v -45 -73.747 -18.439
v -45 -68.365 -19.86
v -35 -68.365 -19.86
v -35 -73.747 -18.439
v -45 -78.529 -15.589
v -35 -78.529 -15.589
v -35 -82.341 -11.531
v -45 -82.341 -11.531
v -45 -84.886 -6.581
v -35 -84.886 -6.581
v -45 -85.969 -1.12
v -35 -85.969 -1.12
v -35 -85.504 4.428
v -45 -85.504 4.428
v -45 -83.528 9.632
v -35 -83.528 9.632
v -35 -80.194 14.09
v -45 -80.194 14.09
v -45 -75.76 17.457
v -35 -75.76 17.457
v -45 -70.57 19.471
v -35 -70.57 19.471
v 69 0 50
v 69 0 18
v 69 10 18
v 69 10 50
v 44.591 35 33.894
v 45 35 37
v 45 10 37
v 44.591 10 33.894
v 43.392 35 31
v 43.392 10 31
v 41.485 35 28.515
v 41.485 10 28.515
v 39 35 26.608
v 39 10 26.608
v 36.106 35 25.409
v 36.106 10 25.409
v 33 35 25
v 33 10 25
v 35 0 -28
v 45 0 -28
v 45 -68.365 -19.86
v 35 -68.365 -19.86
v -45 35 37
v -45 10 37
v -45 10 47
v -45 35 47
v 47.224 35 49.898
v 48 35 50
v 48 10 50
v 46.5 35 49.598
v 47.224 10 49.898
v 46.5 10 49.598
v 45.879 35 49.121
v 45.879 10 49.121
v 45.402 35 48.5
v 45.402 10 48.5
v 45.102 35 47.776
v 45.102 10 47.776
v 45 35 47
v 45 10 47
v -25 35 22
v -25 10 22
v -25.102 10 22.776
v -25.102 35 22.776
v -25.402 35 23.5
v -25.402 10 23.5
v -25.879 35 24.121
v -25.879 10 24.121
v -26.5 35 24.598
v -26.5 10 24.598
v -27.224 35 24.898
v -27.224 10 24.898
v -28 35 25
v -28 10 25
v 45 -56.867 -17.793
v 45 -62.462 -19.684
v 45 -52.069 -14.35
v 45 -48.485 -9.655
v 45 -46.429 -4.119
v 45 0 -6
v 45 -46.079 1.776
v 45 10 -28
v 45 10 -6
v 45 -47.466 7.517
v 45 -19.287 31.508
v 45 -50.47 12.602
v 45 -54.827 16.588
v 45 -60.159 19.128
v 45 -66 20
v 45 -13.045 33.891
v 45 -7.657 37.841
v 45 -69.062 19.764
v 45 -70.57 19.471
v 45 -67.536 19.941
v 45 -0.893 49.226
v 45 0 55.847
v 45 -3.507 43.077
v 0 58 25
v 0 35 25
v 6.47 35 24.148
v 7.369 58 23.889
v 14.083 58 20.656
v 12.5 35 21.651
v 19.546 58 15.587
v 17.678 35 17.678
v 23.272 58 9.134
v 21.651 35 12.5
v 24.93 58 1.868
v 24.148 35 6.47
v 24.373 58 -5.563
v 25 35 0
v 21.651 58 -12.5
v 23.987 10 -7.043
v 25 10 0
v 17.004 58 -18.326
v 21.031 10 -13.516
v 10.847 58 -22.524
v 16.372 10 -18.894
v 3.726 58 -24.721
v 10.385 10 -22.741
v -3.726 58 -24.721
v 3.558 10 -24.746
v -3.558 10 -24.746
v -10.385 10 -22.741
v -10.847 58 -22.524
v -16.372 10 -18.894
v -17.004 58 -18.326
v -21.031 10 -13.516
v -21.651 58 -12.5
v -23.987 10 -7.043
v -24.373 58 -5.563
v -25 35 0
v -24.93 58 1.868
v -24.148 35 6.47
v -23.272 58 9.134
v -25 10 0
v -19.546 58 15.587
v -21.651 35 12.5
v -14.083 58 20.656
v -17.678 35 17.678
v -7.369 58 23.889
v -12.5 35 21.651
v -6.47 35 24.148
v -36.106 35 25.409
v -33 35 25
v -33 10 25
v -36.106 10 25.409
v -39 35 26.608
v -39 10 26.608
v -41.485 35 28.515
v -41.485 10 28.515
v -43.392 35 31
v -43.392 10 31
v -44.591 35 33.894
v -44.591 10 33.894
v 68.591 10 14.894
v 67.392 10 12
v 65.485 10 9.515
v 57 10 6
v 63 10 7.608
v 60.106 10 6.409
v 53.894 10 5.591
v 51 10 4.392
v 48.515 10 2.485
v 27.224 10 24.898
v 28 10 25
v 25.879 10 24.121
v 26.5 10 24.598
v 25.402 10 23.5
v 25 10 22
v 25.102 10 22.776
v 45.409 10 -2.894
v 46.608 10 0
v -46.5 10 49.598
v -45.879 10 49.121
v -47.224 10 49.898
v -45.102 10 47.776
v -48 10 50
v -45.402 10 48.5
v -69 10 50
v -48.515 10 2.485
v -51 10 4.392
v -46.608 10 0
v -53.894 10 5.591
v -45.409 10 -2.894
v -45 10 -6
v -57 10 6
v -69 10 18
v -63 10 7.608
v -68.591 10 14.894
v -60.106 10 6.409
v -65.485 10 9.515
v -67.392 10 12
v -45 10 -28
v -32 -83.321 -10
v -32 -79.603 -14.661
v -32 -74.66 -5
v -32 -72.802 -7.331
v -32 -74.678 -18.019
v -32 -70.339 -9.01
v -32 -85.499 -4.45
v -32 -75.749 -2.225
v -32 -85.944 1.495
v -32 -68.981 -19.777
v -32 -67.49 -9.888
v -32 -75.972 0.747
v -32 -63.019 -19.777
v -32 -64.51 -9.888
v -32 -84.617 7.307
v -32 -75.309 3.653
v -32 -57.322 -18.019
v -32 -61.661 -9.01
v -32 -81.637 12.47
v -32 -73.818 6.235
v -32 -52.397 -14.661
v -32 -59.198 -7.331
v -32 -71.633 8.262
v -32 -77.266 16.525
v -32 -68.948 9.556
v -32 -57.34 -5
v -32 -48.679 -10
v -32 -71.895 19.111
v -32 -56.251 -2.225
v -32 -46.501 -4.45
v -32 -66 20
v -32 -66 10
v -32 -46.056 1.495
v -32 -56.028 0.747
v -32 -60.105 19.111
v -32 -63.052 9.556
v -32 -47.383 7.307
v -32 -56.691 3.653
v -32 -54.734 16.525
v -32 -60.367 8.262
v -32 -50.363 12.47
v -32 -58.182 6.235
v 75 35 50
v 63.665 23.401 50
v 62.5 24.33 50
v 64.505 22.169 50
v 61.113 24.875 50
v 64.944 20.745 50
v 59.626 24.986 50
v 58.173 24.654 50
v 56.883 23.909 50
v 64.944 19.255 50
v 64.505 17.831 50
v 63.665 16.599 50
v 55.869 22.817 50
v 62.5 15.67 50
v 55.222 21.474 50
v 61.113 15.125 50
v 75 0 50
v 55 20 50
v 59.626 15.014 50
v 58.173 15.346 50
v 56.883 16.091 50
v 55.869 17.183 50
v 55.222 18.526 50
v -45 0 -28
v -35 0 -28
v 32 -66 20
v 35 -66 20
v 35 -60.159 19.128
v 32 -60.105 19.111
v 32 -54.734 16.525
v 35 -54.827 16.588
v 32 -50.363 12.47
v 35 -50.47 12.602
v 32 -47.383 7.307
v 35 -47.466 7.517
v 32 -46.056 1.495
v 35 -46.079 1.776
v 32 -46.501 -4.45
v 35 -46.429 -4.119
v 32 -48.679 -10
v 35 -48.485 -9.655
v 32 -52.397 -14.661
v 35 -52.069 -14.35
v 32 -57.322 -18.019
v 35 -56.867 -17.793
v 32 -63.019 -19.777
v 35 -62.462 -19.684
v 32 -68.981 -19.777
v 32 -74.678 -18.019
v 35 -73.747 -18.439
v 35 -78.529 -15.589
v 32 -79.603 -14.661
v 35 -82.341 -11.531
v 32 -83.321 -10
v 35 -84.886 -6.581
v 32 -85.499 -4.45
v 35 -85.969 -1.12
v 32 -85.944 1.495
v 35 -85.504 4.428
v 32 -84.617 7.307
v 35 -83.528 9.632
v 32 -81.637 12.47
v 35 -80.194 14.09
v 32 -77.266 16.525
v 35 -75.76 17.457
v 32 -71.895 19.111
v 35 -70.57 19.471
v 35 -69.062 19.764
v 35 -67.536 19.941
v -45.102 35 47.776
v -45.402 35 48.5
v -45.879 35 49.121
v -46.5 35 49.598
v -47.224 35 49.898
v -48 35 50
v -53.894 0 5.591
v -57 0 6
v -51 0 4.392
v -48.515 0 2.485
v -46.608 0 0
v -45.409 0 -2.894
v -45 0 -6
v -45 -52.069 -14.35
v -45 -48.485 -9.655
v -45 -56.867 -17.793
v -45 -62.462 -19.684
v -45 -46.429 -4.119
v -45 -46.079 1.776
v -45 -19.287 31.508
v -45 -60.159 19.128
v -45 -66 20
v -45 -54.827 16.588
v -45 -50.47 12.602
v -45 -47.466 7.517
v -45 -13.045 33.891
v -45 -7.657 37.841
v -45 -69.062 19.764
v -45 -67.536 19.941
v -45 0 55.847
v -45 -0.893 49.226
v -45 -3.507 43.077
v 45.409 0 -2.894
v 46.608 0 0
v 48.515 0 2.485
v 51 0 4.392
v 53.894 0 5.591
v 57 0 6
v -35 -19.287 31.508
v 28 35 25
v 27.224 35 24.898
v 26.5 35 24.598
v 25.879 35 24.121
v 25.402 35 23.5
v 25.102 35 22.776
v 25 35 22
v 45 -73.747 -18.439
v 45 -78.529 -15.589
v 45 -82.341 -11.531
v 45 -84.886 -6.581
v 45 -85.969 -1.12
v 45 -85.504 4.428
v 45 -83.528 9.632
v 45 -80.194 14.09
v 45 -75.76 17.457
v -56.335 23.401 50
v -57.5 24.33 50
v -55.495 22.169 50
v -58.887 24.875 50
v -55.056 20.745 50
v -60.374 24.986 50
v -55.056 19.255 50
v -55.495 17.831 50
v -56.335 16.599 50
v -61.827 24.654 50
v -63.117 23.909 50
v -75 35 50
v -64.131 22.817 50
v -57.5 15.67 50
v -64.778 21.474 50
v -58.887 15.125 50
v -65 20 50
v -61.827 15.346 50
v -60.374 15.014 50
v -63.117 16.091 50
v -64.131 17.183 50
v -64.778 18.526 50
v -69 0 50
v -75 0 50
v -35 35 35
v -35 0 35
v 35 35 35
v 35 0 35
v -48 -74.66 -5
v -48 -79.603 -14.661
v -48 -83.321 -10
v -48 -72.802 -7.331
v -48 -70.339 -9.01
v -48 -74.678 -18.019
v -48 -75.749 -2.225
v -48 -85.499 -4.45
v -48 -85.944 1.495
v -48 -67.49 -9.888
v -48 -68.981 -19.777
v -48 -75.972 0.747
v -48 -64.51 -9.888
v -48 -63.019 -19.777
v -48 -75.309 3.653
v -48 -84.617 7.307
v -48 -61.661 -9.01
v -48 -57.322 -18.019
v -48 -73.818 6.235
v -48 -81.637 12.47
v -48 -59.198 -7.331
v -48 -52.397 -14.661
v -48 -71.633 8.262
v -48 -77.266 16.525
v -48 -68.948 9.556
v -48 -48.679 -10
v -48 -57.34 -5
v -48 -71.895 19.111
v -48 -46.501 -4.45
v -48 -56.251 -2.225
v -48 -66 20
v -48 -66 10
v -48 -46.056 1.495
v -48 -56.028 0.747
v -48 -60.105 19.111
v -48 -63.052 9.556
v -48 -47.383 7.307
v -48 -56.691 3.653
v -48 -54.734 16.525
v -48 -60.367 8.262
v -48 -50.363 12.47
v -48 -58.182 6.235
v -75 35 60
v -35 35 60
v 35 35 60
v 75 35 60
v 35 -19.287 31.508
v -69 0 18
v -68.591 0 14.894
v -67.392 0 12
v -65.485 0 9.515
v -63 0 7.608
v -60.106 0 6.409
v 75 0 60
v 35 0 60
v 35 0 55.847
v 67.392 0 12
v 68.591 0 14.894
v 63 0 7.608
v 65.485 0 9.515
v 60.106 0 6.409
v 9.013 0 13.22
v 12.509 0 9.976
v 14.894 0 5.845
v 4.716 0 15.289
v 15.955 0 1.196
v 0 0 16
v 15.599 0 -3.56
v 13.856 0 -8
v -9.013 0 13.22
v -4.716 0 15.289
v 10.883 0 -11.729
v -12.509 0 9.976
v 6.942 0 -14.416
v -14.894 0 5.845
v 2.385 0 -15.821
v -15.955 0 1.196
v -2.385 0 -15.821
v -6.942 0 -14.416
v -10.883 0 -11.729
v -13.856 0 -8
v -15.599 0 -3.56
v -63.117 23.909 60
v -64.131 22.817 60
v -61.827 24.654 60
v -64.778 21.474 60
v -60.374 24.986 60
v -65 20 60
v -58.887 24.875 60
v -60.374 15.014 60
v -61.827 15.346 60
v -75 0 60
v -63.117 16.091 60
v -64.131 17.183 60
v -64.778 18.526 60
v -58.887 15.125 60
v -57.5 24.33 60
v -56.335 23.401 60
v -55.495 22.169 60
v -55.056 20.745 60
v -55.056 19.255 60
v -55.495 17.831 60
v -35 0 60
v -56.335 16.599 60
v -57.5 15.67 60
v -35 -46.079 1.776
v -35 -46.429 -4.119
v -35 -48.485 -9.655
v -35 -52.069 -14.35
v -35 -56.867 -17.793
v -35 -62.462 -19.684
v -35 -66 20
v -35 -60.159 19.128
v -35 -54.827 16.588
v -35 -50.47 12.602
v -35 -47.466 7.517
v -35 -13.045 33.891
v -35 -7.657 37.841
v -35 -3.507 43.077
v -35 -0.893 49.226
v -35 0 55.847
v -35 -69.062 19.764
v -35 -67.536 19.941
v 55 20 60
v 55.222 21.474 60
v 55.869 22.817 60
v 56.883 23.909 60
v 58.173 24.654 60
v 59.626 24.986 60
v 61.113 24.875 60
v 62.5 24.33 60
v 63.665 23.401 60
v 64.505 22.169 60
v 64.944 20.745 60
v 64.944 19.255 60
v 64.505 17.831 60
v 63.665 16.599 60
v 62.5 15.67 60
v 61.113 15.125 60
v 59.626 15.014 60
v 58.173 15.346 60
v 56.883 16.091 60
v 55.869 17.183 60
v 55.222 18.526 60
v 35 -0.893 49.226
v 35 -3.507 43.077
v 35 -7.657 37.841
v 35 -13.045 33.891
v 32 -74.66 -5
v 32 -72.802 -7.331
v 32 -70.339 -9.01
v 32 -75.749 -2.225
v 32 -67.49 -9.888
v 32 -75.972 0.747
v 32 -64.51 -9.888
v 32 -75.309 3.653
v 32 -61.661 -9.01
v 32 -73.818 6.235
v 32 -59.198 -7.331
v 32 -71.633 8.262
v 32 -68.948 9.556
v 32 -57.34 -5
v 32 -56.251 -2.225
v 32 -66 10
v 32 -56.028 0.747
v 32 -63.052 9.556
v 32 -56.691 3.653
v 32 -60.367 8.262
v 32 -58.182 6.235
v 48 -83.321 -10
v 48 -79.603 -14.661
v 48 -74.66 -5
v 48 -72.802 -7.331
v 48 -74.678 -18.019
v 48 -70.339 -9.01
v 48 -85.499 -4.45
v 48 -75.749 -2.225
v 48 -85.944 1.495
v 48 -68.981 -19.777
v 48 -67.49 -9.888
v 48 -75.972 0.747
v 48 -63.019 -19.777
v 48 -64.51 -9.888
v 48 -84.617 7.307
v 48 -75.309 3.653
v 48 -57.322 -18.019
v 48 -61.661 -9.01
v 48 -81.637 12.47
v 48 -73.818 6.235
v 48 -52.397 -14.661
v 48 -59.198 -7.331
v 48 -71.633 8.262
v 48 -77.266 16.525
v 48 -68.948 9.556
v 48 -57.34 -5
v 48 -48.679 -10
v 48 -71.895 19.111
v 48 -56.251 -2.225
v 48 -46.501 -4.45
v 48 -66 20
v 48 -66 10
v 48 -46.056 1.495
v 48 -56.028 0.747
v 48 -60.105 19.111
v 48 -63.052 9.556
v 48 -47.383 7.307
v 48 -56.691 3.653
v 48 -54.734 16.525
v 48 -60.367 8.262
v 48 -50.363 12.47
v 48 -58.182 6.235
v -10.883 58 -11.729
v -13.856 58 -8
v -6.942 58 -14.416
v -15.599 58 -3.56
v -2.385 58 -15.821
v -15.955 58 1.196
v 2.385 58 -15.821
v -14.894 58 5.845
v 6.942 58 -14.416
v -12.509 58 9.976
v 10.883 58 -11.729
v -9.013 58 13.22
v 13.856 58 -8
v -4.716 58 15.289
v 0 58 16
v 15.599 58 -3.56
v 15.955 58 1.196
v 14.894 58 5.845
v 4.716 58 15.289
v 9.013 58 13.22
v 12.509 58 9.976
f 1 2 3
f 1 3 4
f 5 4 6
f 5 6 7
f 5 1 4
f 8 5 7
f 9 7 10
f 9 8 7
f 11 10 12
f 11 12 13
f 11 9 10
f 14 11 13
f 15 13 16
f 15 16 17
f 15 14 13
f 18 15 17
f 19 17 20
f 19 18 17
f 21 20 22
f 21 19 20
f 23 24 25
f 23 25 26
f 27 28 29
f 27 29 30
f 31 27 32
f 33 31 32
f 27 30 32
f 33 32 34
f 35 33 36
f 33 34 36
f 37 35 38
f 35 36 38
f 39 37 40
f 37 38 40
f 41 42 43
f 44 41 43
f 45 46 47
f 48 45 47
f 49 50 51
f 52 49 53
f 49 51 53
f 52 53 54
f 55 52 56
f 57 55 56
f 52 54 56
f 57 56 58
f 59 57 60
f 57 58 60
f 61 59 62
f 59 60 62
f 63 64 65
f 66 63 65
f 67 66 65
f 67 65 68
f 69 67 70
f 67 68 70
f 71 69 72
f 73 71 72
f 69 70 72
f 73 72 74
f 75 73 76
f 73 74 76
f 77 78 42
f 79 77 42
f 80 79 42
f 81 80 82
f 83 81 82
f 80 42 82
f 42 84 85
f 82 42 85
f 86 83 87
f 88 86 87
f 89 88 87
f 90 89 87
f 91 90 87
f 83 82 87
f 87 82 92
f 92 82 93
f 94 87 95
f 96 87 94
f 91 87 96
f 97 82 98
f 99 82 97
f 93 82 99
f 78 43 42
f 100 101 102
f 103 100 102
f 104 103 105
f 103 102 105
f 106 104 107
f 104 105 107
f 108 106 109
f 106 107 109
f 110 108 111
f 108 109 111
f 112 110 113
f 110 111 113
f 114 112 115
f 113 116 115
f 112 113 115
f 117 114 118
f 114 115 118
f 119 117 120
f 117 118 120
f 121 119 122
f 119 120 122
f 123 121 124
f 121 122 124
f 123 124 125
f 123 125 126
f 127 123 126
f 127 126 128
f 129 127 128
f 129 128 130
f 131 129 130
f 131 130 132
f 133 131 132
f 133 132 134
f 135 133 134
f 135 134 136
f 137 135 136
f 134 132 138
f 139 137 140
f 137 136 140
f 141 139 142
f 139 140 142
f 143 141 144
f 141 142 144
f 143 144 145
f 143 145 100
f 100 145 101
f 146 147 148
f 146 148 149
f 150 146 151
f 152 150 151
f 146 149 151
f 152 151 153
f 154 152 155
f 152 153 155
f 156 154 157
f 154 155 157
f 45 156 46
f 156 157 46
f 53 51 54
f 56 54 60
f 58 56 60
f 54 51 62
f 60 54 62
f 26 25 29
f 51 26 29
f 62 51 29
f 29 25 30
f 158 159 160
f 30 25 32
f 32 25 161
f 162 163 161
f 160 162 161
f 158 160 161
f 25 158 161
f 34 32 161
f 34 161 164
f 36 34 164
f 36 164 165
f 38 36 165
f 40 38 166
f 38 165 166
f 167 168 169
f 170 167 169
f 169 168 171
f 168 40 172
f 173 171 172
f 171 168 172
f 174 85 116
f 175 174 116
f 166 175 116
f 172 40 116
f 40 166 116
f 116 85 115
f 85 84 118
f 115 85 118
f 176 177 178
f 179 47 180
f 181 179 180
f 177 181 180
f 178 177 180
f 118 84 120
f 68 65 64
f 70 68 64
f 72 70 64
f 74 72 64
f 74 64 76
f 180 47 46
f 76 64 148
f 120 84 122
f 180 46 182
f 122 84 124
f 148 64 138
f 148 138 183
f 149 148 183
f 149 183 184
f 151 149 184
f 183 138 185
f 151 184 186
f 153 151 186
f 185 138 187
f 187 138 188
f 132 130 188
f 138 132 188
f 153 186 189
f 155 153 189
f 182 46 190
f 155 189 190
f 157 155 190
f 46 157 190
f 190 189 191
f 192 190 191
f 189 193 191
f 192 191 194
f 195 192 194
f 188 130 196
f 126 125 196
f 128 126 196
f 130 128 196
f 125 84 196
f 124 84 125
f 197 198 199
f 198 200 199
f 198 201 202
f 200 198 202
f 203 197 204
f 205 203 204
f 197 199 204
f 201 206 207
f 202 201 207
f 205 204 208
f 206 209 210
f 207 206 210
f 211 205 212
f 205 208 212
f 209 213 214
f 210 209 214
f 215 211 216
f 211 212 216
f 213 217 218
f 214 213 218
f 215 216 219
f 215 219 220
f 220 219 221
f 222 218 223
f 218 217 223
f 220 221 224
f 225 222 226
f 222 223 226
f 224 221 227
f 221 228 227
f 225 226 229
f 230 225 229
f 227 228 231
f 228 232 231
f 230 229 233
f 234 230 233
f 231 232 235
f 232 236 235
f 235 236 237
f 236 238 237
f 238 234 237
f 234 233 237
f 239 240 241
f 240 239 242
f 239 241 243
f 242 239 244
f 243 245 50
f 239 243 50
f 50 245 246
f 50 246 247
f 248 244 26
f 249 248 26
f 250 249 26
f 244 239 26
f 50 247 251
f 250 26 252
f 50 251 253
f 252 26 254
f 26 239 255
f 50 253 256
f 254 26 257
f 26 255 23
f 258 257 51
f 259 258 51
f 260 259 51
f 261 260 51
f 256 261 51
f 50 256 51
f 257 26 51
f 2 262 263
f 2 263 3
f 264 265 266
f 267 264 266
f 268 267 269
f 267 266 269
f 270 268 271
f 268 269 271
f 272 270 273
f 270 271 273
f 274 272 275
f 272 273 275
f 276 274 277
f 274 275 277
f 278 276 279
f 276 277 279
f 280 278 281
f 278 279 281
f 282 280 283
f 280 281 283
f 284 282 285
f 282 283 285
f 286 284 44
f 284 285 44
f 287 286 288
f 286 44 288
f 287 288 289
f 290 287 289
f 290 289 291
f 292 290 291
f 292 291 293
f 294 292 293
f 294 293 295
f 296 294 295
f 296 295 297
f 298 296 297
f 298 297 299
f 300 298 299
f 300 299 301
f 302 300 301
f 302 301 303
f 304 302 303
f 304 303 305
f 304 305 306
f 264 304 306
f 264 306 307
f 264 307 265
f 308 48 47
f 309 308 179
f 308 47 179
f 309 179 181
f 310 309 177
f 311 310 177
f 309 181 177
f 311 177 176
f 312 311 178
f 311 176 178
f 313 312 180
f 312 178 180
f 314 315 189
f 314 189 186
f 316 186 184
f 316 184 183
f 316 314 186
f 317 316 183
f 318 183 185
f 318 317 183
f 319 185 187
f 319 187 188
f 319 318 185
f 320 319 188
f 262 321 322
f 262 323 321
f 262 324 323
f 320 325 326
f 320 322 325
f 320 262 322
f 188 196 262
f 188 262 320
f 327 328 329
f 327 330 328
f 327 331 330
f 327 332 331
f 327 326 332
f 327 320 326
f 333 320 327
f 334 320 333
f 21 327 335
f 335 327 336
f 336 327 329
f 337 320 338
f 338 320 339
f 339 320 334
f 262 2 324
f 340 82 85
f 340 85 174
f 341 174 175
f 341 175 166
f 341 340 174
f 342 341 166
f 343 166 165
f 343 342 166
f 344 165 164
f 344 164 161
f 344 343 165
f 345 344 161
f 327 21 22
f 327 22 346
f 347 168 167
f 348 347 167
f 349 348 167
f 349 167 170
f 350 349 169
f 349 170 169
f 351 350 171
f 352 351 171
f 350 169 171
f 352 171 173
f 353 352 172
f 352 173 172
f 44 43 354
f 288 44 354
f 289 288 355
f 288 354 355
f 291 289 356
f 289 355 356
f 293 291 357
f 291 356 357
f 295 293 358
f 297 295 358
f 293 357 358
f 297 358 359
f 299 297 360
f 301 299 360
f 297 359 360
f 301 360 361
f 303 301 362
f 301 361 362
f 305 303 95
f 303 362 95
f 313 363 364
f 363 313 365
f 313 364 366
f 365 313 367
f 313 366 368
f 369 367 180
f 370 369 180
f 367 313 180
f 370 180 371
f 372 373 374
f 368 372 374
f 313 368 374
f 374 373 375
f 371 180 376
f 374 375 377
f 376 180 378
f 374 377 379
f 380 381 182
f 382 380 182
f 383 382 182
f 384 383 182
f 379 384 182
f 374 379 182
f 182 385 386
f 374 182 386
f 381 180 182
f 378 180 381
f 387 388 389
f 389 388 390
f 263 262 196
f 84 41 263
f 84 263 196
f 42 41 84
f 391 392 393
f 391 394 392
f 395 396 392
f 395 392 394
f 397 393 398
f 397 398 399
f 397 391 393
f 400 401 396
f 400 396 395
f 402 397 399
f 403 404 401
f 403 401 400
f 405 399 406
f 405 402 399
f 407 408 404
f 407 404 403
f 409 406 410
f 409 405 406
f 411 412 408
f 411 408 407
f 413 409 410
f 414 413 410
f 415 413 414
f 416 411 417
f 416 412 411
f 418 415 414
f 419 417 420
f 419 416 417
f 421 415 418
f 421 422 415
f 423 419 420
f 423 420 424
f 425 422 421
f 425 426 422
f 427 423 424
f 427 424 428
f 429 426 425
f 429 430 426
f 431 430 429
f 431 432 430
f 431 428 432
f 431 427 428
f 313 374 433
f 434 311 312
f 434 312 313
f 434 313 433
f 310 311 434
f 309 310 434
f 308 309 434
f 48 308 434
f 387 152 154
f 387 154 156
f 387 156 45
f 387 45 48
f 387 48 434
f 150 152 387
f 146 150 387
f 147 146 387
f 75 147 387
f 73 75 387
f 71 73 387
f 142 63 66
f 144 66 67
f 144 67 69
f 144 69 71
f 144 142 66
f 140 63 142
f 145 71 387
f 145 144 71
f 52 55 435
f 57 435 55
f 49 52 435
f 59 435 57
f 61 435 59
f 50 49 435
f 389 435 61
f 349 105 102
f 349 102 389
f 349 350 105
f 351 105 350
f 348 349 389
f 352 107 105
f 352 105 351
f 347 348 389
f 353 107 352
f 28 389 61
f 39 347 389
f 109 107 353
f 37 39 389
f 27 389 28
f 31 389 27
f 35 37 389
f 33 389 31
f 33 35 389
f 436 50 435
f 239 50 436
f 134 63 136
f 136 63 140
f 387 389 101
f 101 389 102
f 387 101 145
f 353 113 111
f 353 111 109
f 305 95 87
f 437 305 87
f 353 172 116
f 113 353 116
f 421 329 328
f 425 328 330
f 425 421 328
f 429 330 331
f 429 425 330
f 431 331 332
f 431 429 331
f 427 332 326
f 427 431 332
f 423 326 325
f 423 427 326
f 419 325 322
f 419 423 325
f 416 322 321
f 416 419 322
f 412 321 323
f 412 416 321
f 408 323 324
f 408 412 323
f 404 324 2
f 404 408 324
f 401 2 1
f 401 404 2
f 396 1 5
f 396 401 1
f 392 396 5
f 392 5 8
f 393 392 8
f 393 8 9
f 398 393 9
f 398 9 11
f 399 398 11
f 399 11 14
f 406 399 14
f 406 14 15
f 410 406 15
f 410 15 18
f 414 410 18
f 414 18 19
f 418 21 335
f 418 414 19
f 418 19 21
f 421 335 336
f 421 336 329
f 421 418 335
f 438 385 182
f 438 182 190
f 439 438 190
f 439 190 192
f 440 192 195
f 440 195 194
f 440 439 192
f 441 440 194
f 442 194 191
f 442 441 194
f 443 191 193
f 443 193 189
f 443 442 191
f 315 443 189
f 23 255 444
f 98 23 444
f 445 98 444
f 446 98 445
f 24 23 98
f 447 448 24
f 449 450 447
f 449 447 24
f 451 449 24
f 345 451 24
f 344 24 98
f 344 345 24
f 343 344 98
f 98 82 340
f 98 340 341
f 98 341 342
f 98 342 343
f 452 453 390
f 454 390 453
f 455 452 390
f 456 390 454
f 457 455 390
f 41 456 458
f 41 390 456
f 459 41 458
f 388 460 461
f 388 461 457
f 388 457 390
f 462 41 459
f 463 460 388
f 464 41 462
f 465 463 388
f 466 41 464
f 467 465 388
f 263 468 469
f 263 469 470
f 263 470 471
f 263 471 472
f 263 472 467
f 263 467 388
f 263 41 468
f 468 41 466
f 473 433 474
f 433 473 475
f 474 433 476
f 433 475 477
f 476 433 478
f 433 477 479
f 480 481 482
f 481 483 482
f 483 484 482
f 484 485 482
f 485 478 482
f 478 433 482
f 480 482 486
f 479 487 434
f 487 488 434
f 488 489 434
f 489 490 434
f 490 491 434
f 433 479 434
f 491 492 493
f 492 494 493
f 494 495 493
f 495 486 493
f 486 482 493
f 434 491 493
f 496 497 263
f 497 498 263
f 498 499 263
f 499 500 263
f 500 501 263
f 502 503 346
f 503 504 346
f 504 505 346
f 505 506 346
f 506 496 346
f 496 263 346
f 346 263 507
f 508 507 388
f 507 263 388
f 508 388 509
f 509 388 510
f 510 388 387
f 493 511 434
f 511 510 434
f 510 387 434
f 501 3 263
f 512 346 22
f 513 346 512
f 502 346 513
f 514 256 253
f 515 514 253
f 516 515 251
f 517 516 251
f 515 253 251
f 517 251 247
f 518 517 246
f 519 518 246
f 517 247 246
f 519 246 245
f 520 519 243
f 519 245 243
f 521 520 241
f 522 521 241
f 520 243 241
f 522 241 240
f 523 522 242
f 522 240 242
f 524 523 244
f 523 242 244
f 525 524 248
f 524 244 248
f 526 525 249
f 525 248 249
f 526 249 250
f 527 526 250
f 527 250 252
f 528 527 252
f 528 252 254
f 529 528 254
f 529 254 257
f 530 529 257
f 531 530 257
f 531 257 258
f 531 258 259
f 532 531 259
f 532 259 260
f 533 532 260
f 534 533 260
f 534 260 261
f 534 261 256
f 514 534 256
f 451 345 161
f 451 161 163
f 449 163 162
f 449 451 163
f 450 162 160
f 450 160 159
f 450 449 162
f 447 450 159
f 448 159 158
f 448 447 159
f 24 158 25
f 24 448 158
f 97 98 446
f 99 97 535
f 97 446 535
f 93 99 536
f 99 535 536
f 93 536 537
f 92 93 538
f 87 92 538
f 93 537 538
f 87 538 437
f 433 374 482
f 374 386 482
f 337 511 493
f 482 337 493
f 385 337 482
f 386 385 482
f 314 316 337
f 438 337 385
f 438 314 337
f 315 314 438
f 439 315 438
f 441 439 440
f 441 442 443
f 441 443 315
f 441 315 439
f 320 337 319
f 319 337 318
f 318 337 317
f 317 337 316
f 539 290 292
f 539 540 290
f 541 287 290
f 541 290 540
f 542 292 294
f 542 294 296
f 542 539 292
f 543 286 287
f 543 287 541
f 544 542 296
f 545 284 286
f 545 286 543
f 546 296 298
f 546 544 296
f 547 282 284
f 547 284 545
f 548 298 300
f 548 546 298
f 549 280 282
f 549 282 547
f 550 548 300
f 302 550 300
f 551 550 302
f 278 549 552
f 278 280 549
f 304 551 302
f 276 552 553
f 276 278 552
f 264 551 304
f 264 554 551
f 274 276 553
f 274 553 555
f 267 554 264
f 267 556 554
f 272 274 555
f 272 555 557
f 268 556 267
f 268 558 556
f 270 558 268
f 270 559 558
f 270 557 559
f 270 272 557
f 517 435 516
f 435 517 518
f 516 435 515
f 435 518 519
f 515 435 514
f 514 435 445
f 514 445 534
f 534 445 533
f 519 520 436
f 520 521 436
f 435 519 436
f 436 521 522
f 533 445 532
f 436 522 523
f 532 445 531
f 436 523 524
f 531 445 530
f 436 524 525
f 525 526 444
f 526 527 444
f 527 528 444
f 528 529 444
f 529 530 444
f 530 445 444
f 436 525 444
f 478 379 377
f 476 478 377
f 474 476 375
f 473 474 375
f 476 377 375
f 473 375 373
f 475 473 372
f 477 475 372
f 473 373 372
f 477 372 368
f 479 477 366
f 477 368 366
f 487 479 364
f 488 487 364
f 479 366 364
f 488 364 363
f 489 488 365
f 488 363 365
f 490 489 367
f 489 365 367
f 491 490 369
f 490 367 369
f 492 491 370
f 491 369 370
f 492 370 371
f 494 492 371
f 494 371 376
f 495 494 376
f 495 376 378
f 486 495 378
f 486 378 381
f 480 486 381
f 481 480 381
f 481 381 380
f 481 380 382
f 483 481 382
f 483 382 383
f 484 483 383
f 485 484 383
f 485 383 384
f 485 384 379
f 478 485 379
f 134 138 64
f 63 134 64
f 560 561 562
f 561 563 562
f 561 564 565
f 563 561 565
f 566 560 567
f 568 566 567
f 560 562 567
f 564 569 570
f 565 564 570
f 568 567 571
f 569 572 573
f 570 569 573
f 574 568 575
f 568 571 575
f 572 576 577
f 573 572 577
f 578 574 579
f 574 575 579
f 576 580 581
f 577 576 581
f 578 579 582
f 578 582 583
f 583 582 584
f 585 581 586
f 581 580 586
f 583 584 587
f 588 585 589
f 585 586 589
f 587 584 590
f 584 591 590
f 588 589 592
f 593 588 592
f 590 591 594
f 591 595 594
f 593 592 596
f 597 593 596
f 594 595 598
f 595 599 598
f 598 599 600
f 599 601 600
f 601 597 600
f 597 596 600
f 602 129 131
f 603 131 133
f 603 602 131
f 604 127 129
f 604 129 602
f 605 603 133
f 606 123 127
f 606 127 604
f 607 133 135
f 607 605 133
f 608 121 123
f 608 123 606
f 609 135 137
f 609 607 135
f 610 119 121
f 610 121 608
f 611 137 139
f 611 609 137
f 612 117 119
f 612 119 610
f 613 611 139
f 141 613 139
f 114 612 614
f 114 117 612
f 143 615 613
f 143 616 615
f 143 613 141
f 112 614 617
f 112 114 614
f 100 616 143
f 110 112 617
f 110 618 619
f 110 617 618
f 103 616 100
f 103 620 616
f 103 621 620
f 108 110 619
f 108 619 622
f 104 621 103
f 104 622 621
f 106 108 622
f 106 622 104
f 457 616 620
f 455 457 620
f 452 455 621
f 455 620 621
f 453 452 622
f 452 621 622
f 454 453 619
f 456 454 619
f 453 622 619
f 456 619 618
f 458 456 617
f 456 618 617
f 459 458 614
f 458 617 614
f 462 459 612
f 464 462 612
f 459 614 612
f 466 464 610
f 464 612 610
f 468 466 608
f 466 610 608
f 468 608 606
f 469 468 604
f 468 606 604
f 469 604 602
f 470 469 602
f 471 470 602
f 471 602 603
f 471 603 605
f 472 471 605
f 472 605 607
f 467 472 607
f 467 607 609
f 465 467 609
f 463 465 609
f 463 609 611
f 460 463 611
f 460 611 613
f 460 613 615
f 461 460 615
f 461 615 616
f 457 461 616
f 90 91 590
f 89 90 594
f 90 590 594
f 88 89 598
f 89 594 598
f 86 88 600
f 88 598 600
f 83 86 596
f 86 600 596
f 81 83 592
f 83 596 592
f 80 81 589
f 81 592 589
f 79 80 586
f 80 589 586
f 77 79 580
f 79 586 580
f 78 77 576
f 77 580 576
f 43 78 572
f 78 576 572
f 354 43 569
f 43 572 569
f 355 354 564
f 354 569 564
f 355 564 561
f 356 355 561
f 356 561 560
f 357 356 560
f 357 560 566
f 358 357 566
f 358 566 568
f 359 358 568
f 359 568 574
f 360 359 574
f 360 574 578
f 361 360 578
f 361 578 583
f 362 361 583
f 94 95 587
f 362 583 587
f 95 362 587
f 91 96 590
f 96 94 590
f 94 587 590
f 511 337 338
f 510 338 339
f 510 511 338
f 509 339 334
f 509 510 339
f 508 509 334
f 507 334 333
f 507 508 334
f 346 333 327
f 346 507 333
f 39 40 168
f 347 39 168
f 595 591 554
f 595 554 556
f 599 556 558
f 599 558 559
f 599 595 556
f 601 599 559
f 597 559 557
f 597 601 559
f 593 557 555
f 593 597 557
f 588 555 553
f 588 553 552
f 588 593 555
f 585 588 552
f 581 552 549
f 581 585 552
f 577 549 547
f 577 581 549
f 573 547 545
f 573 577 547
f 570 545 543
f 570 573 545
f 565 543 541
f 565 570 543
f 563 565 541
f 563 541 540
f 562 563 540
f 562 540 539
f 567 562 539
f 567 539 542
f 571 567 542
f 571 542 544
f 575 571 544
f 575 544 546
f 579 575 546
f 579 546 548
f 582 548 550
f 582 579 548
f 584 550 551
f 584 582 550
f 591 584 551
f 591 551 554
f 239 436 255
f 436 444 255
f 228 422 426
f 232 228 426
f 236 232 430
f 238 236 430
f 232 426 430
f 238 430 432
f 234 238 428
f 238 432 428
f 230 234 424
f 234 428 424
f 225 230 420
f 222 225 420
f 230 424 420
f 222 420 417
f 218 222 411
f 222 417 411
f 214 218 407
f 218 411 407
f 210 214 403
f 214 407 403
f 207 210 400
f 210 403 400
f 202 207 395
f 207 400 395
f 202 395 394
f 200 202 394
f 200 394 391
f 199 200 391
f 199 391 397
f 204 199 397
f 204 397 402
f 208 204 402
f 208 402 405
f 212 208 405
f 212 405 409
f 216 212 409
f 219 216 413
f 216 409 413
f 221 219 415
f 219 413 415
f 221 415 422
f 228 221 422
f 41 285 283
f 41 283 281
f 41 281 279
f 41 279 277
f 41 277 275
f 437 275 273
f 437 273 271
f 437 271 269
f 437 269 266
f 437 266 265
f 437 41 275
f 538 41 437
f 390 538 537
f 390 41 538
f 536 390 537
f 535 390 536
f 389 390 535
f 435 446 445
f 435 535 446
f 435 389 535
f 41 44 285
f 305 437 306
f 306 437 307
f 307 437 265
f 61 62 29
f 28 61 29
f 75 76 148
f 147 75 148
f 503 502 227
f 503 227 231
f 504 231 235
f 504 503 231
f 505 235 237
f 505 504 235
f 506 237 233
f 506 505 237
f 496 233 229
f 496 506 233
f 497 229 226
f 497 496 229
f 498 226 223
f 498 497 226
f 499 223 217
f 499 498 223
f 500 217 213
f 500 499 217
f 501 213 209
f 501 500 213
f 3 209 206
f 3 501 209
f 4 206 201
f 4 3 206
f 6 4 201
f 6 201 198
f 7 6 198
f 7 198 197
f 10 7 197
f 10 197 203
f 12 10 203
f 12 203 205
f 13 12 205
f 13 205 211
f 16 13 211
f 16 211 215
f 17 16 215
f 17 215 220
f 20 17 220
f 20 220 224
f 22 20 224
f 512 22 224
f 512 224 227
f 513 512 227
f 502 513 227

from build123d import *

# Parameters (mm, degrees)
BOSS_EXTRUDE1_DEPTH  = 10
SKETCH2_R            = 25
BOSS_EXTRUDE2_DEPTH  = 48
SKETCH3_R            = 16
CUT_EXTRUDE1_DEPTH   = 59
BOSS_EXTRUDE3_DEPTH  = 25
BOSS_EXTRUDE5_DEPTH  = 10
SKETCH6_R            = 20
BOSS_EXTRUDE6_DEPTH  = 8
SKETCH7_R            = 10
CUT_EXTRUDE2_DEPTH   = 16
FILLET1_R            = 25
FILLET1_OF_MIRROR1_R = 25
CUT_EXTRUDE3_REACH   = 12
SKETCH8_R            = 5


with BuildPart() as part:
    # Sketch1 → Boss-Extrude1 (new body)
    with BuildSketch(Plane(origin=(0, 0, 0), x_dir=(1, 0, 0), z_dir=(0, 1, 0))):
        with BuildLine():
            Line((-45, 28), (45, 28))
            Line((45, 28), (45, 6))
            ThreePointArc((45, 6), (48.514718626, -2.485281374), (57, -6))
            ThreePointArc((57, -6), (65.485281374, -9.514718626), (69, -18))
            Line((69, -18), (69, -50))
            Line((69, -50), (75, -50))
            Line((75, -50), (75, -60))
            Line((75, -60), (35, -60))
            Line((35, -60), (35, -35))
            Line((35, -35), (-35, -35))
            Line((-35, -35), (-35, -60))
            Line((-35, -60), (-75, -60))
            Line((-75, -60), (-75, -50))
            Line((-75, -50), (-69, -50))
            Line((-69, -50), (-69, -18))
            ThreePointArc((-69, -18), (-65.485281374, -9.514718626), (-57, -6))
            ThreePointArc((-57, -6), (-48.514718626, -2.485281374), (-45, 6))
            Line((-45, 6), (-45, 28))
        make_face()
    extrude(amount=BOSS_EXTRUDE1_DEPTH)

    # Sketch2 → Boss-Extrude2 (add)
    with BuildSketch(Plane(origin=(0, 10, 0), x_dir=(1, 0, 0), z_dir=(0, 1, 0))):
        with Locations(Location((0, 0, 0), (0, 0, 270))):  # turned: the seam where the file's is
            Circle(SKETCH2_R)
    extrude(amount=BOSS_EXTRUDE2_DEPTH)

    # Sketch3 → Cut-Extrude1 (cut, through all)
    with BuildSketch(Plane(origin=(0, 58, 0), x_dir=(1, 0, 0), z_dir=(0, 1, 0))):
        with Locations(Location((0, 0, 0), (0, 0, 270))):  # turned: the seam where the file's is
            Circle(SKETCH3_R)
    extrude(amount=-CUT_EXTRUDE1_DEPTH, mode=Mode.SUBTRACT)

    # Sketch4 → Boss-Extrude3 (add)
    with BuildSketch(Plane(origin=(0, 10, 0), x_dir=(1, 0, 0), z_dir=(0, 1, 0))):
        with BuildLine():
            Line((-25, 0), (-25, -22))
            ThreePointArc((-25, -22), (-25.878679656, -24.121320344), (-28, -25))
            Line((-28, -25), (-33, -25))
            ThreePointArc((-33, -25), (-41.485281374, -28.514718626), (-45, -37))
            Line((-45, -37), (-45, -47))
            ThreePointArc((-45, -47), (-45.878679656, -49.121320344), (-48, -50))
            Line((-48, -50), (-75, -50))
            Line((-75, -50), (-75, -60))
            Line((-75, -60), (-35, -60))
            Line((-35, -60), (-35, -35))
            Line((-35, -35), (35, -35))
            Line((35, -35), (35, -60))
            Line((35, -60), (75, -60))
            Line((75, -60), (75, -50))
            Line((75, -50), (48, -50))
            ThreePointArc((48, -50), (45.878679656, -49.121320344), (45, -47))
            Line((45, -47), (45, -37))
            ThreePointArc((45, -37), (41.485281374, -28.514718626), (33, -25))
            Line((33, -25), (28, -25))
            ThreePointArc((28, -25), (25.878679656, -24.121320344), (25, -22))
            Line((25, -22), (25, 0))
            ThreePointArc((25, 0), (0, -25), (-25, 0))
        make_face()
    extrude(amount=BOSS_EXTRUDE3_DEPTH)

    # Sketch5 → Boss-Extrude5 (add)
    with BuildSketch(Plane.ZY.offset(45)):
        with BuildLine():
            Line((-28, 0), (-19.859709814, -68.364725376))
            ThreePointArc((-19.859709814, -68.364725376), (-1.119802535, -85.96862645), (19.470806475, -70.570305811))
            Line((19.470806475, -70.570305811), (36.035496755, 0))
            Line((36.035496755, 0), (-28, 0))
        make_face()
    boss_extrude5 = extrude(amount=-BOSS_EXTRUDE5_DEPTH)

    # Sketch6 → Boss-Extrude6 (add, symmetric)
    with BuildSketch(Plane.ZY.offset(40)):
        with Locations((0, -66)):
            Circle(SKETCH6_R)
    boss_extrude6 = extrude(amount=BOSS_EXTRUDE6_DEPTH, both=True)

    # Sketch7 → Cut-Extrude2 (cut)
    with BuildSketch(Plane.ZY.offset(48)):
        with Locations((0, -66)):
            Circle(SKETCH7_R)
    cut_extrude2 = extrude(amount=-CUT_EXTRUDE2_DEPTH, mode=Mode.SUBTRACT)

    # Fillet1
    fillet1_edges = [part.edges().sort_by_distance(p)[0] for p in [
        (-40, 0, 36.035496755),
    ]]
    fillet(fillet1_edges, radius=FILLET1_R)

    # Mirror1: Boss-Extrude5, Boss-Extrude6, Cut-Extrude2 across plane
    add(boss_extrude5.mirror(Plane(origin=(0, 0, 0), x_dir=(0, 0, 1), z_dir=(1, 0, 0))))
    add(boss_extrude6.mirror(Plane(origin=(0, 0, 0), x_dir=(0, 0, 1), z_dir=(1, 0, 0))))
    add(cut_extrude2.mirror(Plane(origin=(0, 0, 0), x_dir=(0, 0, 1), z_dir=(1, 0, 0))), mode=Mode.SUBTRACT)

    # Fillet1 of Mirror1
    fillet1_of_mirror1_edges = [part.edges().sort_by_distance(p)[0] for p in [
        (40, 0, 36.035496755),
    ]]
    fillet(fillet1_of_mirror1_edges, radius=FILLET1_OF_MIRROR1_R)

    # Sketch8 → Cut-Extrude3 (cut, up to next)
    with BuildSketch(Plane(origin=(0, 0, 50), x_dir=(-1, 0, 0), z_dir=(0, 0, -1)), mode=Mode.PRIVATE) as cut_extrude3_sk1:
        with Locations((-60, 20)):
            Circle(SKETCH8_R)
    cut_extrude3_tool1 = extrude(cut_extrude3_sk1.sketch, amount=-CUT_EXTRUDE3_REACH, mode=Mode.PRIVATE) & part.part
    add(cut_extrude3_tool1.solids().sort_by_distance((60, 20, 50))[0], mode=Mode.SUBTRACT)
    # Sketch8 → Cut-Extrude3 (cut, up to next)
    with BuildSketch(Plane(origin=(0, 0, 50), x_dir=(-1, 0, 0), z_dir=(0, 0, -1)), mode=Mode.PRIVATE) as cut_extrude3_sk2:
        with Locations((60, 20)):
            Circle(SKETCH8_R)
    cut_extrude3_tool2 = extrude(cut_extrude3_sk2.sketch, amount=-CUT_EXTRUDE3_REACH, mode=Mode.PRIVATE) & part.part
    add(cut_extrude3_tool2.solids().sort_by_distance((-60, 20, 50))[0], mode=Mode.SUBTRACT)


solid = part.part
